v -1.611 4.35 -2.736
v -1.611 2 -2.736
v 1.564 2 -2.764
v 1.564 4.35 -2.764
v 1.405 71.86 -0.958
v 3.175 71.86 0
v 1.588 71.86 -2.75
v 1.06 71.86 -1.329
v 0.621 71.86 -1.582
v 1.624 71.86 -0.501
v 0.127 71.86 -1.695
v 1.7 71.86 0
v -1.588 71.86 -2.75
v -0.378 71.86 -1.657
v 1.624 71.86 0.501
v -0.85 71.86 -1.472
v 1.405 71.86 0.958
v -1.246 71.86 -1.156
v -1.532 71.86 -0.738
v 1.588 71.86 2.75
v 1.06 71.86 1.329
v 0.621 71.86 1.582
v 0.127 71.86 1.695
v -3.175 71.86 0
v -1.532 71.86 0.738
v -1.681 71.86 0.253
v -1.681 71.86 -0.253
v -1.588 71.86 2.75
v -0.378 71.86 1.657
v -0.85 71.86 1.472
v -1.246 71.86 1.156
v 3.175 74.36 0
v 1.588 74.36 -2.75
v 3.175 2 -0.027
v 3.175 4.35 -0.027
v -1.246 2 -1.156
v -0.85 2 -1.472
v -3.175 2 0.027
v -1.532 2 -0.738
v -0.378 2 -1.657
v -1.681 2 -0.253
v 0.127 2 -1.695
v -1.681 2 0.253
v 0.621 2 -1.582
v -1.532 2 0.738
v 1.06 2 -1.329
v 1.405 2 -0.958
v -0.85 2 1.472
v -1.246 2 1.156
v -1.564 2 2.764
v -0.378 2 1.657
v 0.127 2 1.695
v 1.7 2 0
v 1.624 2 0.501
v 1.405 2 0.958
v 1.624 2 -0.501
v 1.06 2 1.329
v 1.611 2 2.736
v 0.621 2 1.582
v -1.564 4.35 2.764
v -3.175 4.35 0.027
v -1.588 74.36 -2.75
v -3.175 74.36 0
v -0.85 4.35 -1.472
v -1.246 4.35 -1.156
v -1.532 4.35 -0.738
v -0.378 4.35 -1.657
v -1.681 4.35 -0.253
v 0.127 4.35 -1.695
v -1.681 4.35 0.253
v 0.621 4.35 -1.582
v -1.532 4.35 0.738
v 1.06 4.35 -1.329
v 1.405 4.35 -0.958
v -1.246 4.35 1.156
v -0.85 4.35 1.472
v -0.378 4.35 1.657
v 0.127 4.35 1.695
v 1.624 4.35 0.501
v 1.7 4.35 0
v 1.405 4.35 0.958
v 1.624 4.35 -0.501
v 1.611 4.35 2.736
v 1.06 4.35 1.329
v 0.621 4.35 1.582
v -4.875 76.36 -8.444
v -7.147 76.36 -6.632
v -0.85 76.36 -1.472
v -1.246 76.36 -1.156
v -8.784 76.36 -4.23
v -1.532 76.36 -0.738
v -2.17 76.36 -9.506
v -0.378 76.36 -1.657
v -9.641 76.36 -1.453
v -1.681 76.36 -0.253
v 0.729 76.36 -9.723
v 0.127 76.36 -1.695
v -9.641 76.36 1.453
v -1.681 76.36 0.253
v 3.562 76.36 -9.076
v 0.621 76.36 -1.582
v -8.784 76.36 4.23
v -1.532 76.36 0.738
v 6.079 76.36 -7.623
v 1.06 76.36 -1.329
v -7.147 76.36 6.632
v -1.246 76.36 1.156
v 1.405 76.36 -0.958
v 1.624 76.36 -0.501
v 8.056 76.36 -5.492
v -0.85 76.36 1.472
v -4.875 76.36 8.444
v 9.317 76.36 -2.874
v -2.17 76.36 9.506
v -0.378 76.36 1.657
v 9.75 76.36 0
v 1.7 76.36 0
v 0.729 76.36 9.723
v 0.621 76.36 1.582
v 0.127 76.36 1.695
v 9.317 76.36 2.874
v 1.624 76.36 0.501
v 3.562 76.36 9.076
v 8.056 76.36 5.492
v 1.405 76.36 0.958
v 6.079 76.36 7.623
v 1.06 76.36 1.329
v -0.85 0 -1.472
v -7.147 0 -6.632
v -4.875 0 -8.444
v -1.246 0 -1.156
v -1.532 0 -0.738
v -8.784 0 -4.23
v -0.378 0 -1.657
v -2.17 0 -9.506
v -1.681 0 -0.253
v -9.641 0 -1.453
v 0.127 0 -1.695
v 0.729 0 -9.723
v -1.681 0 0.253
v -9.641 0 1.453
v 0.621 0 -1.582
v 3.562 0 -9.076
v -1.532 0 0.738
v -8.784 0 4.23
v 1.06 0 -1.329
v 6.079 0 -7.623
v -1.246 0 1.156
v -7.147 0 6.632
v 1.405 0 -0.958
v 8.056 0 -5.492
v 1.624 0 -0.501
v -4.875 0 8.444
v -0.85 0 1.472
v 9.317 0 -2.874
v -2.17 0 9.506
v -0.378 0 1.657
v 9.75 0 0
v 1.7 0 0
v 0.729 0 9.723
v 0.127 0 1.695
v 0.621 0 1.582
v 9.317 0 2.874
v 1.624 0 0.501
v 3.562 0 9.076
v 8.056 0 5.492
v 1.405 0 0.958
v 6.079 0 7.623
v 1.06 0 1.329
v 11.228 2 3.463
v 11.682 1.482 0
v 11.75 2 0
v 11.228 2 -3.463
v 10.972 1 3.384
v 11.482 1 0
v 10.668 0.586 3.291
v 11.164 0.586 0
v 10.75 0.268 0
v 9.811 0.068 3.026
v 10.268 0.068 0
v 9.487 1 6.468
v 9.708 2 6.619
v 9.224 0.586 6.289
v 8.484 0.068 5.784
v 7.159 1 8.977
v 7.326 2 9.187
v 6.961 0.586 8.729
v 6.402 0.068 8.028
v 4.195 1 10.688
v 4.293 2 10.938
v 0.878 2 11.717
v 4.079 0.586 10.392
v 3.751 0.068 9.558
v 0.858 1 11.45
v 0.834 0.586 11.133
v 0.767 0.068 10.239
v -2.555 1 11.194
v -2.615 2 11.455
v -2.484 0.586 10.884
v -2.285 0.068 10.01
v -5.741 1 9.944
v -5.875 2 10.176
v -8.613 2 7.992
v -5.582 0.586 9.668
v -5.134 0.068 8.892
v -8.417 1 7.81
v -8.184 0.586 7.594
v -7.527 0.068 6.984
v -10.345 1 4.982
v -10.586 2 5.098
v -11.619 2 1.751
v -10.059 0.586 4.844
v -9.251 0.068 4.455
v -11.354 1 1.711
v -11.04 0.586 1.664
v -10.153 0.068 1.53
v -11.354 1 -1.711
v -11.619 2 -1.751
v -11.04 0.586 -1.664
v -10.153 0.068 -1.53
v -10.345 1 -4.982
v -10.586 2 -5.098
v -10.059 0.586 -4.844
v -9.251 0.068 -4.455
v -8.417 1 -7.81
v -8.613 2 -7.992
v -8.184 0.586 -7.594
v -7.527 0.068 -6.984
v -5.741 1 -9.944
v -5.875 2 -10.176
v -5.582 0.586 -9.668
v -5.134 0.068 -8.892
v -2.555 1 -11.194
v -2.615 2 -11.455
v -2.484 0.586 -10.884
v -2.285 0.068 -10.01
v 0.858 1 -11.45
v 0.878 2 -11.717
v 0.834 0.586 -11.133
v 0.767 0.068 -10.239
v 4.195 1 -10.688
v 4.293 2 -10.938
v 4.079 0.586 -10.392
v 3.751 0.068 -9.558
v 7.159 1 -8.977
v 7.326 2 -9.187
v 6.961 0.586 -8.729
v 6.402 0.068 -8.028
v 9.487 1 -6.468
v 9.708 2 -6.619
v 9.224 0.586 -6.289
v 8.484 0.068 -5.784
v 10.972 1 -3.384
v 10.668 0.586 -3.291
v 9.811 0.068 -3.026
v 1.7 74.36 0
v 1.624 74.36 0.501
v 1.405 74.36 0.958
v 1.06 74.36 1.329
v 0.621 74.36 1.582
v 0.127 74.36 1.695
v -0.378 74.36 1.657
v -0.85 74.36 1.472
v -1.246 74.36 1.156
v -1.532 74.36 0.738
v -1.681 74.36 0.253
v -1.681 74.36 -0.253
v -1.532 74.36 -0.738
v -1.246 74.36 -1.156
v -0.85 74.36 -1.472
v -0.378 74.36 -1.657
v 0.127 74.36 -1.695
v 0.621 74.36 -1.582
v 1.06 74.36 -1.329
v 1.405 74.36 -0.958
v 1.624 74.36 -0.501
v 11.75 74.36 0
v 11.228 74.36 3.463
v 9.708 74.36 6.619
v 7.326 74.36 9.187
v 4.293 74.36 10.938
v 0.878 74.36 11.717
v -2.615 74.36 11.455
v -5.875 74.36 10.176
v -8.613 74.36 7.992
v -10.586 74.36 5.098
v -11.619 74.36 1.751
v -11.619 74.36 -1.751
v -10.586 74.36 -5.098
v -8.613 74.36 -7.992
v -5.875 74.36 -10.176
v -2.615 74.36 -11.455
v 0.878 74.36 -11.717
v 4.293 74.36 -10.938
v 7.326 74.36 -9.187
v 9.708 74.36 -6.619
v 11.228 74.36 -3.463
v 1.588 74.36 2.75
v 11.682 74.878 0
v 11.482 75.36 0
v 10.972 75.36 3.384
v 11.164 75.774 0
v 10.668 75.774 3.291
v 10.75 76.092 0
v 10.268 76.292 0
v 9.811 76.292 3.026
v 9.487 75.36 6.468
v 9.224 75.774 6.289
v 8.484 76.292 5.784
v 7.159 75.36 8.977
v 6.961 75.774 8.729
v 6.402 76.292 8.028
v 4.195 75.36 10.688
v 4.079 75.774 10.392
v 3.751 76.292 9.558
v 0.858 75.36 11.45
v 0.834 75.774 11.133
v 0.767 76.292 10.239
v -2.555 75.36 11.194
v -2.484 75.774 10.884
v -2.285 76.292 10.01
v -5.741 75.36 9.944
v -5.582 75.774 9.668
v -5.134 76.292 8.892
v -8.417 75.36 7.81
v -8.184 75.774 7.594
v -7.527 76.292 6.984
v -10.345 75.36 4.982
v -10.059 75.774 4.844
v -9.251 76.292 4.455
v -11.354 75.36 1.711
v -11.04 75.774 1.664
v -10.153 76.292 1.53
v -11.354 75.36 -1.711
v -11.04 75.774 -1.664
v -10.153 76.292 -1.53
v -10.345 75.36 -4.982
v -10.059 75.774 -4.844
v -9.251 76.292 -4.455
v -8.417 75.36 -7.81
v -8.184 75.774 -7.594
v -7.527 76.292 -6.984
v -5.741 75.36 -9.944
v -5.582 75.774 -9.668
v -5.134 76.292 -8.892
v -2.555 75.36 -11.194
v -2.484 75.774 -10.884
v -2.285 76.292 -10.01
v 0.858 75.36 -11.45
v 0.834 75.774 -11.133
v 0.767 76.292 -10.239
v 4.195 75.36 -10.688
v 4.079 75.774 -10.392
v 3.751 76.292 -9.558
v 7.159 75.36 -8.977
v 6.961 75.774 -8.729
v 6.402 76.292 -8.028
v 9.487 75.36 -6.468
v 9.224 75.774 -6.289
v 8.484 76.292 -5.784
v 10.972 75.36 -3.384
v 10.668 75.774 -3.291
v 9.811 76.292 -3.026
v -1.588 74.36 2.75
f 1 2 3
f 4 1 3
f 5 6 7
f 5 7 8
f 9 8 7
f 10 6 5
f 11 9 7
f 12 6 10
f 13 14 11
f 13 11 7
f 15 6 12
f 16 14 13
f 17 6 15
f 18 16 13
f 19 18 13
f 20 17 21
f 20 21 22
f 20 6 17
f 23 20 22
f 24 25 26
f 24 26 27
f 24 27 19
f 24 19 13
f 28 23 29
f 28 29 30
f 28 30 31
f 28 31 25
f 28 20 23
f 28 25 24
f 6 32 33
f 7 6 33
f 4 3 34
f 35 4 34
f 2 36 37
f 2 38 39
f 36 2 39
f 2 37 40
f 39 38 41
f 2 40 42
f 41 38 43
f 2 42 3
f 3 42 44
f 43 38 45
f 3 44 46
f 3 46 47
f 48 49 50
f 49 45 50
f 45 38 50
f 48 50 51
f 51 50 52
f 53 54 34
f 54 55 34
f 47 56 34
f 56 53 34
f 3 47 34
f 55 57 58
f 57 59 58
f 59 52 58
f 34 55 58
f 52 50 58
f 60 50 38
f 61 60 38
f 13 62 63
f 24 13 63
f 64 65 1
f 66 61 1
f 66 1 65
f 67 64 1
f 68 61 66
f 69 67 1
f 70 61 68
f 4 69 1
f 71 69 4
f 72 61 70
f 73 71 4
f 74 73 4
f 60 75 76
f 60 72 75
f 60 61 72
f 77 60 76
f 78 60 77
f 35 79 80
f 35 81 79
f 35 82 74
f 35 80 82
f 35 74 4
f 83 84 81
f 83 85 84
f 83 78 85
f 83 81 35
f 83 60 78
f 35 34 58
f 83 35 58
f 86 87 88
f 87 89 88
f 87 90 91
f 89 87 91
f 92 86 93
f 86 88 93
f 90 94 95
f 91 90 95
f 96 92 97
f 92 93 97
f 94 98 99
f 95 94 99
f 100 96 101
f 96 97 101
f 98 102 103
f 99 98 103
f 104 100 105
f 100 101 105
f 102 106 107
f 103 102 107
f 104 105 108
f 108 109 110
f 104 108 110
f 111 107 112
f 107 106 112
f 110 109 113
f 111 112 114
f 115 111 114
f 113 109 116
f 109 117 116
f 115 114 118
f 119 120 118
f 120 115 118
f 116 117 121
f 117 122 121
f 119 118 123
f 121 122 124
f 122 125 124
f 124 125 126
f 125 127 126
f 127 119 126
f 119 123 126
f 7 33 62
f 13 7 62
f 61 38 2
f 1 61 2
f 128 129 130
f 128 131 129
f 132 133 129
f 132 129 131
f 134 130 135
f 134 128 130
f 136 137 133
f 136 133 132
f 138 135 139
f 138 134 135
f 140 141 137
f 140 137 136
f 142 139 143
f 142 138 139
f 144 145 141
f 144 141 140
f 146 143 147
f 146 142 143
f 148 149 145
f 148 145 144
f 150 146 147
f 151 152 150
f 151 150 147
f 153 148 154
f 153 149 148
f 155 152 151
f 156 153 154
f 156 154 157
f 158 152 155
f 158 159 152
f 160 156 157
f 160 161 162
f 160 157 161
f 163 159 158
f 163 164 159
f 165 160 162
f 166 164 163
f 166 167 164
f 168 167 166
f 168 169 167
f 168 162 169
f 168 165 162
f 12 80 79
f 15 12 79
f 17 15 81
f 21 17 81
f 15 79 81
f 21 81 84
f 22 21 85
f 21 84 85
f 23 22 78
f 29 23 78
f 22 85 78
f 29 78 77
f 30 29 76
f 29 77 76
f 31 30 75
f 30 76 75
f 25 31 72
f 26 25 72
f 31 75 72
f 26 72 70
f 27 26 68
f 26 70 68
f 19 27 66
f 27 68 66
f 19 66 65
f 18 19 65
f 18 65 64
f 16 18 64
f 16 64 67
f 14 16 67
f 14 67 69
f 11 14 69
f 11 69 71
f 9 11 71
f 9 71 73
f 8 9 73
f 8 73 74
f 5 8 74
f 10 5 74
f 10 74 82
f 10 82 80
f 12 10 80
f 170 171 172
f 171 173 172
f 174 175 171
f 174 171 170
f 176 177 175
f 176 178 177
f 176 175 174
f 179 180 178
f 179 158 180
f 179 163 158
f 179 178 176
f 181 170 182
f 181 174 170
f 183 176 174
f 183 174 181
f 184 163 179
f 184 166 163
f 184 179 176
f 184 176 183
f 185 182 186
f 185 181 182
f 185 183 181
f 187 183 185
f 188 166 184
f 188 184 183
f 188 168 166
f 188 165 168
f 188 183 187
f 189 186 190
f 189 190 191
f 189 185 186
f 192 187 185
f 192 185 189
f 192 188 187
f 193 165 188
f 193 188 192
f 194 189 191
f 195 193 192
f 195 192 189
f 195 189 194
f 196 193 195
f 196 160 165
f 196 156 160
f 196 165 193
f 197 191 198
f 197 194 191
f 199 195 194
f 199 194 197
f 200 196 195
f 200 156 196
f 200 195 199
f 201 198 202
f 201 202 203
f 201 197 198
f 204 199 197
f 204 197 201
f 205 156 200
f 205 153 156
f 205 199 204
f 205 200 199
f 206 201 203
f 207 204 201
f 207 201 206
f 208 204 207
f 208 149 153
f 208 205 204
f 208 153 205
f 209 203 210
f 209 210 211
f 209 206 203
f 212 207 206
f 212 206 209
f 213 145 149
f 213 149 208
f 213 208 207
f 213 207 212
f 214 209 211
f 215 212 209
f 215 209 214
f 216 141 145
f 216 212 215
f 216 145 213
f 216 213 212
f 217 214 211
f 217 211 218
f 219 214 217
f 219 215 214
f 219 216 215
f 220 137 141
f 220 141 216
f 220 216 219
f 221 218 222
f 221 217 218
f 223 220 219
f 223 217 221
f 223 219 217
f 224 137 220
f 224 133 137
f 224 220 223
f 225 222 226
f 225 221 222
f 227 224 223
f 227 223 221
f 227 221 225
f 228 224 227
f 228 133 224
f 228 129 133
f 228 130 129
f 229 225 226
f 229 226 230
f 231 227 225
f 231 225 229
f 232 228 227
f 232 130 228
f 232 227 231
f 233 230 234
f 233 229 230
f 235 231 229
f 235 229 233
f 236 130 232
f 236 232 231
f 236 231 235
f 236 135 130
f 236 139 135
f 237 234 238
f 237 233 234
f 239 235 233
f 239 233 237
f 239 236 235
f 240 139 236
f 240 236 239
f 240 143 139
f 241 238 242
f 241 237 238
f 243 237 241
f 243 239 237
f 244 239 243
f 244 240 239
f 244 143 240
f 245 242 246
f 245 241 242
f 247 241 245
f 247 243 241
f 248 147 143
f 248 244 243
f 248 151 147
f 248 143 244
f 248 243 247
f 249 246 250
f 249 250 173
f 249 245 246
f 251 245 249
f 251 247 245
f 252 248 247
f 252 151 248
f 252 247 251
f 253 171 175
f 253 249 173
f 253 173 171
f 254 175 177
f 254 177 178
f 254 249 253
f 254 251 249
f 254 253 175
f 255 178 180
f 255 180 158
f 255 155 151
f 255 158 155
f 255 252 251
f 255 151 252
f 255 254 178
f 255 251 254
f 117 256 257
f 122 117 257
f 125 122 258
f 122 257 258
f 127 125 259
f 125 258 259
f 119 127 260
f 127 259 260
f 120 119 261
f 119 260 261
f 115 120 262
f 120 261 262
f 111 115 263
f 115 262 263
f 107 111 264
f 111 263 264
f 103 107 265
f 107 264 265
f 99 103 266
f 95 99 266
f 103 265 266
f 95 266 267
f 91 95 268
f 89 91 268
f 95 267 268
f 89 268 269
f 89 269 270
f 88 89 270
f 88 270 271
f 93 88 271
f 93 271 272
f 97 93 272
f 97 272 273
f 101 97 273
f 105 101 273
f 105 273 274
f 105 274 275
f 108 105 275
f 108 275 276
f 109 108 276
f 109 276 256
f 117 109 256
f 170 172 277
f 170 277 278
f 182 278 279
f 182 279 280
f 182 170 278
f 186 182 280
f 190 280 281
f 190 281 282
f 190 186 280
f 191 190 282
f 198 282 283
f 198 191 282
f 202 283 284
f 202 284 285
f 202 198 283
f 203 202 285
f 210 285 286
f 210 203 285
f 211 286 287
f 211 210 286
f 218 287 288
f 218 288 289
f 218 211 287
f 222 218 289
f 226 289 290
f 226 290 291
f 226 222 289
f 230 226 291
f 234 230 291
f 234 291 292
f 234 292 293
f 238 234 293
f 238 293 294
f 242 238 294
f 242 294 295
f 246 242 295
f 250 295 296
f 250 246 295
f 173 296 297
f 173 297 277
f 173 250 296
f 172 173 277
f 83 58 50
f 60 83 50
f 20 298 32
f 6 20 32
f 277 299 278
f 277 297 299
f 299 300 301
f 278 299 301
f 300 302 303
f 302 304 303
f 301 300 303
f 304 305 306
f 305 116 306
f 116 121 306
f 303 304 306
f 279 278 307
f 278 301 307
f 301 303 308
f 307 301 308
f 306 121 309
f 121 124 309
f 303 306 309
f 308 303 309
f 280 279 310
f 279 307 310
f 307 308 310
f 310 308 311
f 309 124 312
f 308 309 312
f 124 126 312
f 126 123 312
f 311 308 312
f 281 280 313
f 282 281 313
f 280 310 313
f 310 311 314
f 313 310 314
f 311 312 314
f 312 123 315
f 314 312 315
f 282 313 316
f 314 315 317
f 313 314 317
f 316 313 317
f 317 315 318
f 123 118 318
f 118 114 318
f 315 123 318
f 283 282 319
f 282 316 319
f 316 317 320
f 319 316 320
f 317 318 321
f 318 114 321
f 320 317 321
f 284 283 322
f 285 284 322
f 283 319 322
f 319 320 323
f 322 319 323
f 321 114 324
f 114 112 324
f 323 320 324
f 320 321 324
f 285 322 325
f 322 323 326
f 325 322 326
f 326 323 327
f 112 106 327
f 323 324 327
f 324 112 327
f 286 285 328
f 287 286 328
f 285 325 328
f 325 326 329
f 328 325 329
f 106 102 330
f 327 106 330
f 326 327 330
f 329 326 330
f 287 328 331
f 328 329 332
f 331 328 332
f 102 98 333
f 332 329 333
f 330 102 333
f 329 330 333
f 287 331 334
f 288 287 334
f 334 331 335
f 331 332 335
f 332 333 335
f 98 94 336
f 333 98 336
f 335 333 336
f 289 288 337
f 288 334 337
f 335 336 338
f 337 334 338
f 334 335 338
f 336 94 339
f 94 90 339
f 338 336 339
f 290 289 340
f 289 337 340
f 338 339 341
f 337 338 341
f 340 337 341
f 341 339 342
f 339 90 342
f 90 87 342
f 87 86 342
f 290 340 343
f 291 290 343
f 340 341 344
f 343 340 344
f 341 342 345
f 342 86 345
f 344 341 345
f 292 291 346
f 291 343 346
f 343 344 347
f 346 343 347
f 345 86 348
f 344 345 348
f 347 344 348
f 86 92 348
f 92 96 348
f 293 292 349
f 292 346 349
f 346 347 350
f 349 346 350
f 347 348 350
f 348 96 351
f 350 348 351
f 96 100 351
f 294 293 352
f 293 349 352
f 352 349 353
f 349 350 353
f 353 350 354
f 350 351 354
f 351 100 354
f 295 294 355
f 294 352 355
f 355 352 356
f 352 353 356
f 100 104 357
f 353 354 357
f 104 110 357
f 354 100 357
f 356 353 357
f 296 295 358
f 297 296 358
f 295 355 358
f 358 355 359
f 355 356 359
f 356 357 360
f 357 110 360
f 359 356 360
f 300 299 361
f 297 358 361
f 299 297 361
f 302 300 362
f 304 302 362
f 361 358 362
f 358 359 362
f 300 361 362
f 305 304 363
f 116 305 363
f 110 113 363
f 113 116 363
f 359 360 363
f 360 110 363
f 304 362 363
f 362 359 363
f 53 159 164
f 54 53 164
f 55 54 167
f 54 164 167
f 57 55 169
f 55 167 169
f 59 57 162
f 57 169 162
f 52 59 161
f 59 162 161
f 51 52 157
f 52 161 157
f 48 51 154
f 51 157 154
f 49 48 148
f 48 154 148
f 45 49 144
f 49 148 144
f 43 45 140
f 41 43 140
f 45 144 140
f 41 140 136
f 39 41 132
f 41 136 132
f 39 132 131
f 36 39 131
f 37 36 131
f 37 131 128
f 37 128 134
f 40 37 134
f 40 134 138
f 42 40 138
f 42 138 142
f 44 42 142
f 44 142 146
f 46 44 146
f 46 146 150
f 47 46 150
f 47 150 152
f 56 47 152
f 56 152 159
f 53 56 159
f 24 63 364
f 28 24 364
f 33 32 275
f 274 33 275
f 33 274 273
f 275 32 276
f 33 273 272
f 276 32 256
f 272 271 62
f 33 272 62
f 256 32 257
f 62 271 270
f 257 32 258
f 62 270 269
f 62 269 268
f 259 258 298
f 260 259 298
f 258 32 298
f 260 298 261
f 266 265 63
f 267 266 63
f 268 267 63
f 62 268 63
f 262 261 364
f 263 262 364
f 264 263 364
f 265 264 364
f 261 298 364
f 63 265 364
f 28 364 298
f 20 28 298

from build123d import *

# Parameters (mm, degrees)
F0_R     = 11.75
F0_R_2   = 1.7
F1_DEPTH = 76.36
F2_R     = 2
F3_START = -2
F3_DEPTH = 2.35
F4_DEPTH = 89.7
F6_START = -2
F5_R     = 1.7
F6_DEPTH = 2.5


with BuildPart() as f1:
    # F0 (on Front) → F1 (new body)
    with BuildSketch(Plane.XZ):
        Circle(F0_R)
        Polygon((1.6112496617, 2.7362762765), (3.175309598, -0.0272450006), (1.5640599363, -2.7635212771), (-1.6112496617, -2.7362762765), (-3.175309598, 0.0272450006), (-1.5640599363, 2.7635212771), align=None, mode=Mode.SUBTRACT)
        Polygon((1.5640599363, -2.7635212771), (3.175309598, -0.0272450006), (1.6112496617, 2.7362762765), (-1.5640599363, 2.7635212771), (-3.175309598, 0.0272450006), (-1.6112496617, -2.7362762765), align=None)
        Circle(F0_R_2, mode=Mode.SUBTRACT)
        Circle(F0_R_2)
    extrude(amount=-F1_DEPTH)

    # F2
    f2_edges = [f1.edges().sort_by_distance(p)[0] for p in [
        (-11.75, 0, 0),
        (-11.75, 76.36, 0),
    ]]
    fillet(f2_edges, radius=F2_R)

    # F0 (on Front) → F3 (cut)
    with BuildSketch(Plane.XZ.offset(F3_START)):
        Polygon((1.5640599363, -2.7635212771), (3.175309598, -0.0272450006), (1.6112496617, 2.7362762765), (-1.5640599363, 2.7635212771), (-3.175309598, 0.0272450006), (-1.6112496617, -2.7362762765), align=None)
        Circle(F0_R_2, mode=Mode.SUBTRACT)
    extrude(amount=-F3_DEPTH, mode=Mode.SUBTRACT)

    # F0 (on Front) → F4 (cut)
    with BuildSketch(Plane.XZ):
        Circle(F0_R_2)
    extrude(amount=-F4_DEPTH, mode=Mode.SUBTRACT)

    # F5 (on face) → F6 (cut)
    with BuildSketch(Plane(origin=(0, 76.36, 0), x_dir=(-1, 0, 0), z_dir=(0, 1, 0)).offset(F6_START)):
        Polygon((-1.5877132403, -2.75), (1.5877132403, -2.75), (3.1754264805, 0), (1.5877132403, 2.75), (-1.5877132403, 2.75), (-3.1754264805, 0), align=None)
        Circle(F5_R, mode=Mode.SUBTRACT)
    extrude(amount=-F6_DEPTH, mode=Mode.SUBTRACT)


solid = f1.part
